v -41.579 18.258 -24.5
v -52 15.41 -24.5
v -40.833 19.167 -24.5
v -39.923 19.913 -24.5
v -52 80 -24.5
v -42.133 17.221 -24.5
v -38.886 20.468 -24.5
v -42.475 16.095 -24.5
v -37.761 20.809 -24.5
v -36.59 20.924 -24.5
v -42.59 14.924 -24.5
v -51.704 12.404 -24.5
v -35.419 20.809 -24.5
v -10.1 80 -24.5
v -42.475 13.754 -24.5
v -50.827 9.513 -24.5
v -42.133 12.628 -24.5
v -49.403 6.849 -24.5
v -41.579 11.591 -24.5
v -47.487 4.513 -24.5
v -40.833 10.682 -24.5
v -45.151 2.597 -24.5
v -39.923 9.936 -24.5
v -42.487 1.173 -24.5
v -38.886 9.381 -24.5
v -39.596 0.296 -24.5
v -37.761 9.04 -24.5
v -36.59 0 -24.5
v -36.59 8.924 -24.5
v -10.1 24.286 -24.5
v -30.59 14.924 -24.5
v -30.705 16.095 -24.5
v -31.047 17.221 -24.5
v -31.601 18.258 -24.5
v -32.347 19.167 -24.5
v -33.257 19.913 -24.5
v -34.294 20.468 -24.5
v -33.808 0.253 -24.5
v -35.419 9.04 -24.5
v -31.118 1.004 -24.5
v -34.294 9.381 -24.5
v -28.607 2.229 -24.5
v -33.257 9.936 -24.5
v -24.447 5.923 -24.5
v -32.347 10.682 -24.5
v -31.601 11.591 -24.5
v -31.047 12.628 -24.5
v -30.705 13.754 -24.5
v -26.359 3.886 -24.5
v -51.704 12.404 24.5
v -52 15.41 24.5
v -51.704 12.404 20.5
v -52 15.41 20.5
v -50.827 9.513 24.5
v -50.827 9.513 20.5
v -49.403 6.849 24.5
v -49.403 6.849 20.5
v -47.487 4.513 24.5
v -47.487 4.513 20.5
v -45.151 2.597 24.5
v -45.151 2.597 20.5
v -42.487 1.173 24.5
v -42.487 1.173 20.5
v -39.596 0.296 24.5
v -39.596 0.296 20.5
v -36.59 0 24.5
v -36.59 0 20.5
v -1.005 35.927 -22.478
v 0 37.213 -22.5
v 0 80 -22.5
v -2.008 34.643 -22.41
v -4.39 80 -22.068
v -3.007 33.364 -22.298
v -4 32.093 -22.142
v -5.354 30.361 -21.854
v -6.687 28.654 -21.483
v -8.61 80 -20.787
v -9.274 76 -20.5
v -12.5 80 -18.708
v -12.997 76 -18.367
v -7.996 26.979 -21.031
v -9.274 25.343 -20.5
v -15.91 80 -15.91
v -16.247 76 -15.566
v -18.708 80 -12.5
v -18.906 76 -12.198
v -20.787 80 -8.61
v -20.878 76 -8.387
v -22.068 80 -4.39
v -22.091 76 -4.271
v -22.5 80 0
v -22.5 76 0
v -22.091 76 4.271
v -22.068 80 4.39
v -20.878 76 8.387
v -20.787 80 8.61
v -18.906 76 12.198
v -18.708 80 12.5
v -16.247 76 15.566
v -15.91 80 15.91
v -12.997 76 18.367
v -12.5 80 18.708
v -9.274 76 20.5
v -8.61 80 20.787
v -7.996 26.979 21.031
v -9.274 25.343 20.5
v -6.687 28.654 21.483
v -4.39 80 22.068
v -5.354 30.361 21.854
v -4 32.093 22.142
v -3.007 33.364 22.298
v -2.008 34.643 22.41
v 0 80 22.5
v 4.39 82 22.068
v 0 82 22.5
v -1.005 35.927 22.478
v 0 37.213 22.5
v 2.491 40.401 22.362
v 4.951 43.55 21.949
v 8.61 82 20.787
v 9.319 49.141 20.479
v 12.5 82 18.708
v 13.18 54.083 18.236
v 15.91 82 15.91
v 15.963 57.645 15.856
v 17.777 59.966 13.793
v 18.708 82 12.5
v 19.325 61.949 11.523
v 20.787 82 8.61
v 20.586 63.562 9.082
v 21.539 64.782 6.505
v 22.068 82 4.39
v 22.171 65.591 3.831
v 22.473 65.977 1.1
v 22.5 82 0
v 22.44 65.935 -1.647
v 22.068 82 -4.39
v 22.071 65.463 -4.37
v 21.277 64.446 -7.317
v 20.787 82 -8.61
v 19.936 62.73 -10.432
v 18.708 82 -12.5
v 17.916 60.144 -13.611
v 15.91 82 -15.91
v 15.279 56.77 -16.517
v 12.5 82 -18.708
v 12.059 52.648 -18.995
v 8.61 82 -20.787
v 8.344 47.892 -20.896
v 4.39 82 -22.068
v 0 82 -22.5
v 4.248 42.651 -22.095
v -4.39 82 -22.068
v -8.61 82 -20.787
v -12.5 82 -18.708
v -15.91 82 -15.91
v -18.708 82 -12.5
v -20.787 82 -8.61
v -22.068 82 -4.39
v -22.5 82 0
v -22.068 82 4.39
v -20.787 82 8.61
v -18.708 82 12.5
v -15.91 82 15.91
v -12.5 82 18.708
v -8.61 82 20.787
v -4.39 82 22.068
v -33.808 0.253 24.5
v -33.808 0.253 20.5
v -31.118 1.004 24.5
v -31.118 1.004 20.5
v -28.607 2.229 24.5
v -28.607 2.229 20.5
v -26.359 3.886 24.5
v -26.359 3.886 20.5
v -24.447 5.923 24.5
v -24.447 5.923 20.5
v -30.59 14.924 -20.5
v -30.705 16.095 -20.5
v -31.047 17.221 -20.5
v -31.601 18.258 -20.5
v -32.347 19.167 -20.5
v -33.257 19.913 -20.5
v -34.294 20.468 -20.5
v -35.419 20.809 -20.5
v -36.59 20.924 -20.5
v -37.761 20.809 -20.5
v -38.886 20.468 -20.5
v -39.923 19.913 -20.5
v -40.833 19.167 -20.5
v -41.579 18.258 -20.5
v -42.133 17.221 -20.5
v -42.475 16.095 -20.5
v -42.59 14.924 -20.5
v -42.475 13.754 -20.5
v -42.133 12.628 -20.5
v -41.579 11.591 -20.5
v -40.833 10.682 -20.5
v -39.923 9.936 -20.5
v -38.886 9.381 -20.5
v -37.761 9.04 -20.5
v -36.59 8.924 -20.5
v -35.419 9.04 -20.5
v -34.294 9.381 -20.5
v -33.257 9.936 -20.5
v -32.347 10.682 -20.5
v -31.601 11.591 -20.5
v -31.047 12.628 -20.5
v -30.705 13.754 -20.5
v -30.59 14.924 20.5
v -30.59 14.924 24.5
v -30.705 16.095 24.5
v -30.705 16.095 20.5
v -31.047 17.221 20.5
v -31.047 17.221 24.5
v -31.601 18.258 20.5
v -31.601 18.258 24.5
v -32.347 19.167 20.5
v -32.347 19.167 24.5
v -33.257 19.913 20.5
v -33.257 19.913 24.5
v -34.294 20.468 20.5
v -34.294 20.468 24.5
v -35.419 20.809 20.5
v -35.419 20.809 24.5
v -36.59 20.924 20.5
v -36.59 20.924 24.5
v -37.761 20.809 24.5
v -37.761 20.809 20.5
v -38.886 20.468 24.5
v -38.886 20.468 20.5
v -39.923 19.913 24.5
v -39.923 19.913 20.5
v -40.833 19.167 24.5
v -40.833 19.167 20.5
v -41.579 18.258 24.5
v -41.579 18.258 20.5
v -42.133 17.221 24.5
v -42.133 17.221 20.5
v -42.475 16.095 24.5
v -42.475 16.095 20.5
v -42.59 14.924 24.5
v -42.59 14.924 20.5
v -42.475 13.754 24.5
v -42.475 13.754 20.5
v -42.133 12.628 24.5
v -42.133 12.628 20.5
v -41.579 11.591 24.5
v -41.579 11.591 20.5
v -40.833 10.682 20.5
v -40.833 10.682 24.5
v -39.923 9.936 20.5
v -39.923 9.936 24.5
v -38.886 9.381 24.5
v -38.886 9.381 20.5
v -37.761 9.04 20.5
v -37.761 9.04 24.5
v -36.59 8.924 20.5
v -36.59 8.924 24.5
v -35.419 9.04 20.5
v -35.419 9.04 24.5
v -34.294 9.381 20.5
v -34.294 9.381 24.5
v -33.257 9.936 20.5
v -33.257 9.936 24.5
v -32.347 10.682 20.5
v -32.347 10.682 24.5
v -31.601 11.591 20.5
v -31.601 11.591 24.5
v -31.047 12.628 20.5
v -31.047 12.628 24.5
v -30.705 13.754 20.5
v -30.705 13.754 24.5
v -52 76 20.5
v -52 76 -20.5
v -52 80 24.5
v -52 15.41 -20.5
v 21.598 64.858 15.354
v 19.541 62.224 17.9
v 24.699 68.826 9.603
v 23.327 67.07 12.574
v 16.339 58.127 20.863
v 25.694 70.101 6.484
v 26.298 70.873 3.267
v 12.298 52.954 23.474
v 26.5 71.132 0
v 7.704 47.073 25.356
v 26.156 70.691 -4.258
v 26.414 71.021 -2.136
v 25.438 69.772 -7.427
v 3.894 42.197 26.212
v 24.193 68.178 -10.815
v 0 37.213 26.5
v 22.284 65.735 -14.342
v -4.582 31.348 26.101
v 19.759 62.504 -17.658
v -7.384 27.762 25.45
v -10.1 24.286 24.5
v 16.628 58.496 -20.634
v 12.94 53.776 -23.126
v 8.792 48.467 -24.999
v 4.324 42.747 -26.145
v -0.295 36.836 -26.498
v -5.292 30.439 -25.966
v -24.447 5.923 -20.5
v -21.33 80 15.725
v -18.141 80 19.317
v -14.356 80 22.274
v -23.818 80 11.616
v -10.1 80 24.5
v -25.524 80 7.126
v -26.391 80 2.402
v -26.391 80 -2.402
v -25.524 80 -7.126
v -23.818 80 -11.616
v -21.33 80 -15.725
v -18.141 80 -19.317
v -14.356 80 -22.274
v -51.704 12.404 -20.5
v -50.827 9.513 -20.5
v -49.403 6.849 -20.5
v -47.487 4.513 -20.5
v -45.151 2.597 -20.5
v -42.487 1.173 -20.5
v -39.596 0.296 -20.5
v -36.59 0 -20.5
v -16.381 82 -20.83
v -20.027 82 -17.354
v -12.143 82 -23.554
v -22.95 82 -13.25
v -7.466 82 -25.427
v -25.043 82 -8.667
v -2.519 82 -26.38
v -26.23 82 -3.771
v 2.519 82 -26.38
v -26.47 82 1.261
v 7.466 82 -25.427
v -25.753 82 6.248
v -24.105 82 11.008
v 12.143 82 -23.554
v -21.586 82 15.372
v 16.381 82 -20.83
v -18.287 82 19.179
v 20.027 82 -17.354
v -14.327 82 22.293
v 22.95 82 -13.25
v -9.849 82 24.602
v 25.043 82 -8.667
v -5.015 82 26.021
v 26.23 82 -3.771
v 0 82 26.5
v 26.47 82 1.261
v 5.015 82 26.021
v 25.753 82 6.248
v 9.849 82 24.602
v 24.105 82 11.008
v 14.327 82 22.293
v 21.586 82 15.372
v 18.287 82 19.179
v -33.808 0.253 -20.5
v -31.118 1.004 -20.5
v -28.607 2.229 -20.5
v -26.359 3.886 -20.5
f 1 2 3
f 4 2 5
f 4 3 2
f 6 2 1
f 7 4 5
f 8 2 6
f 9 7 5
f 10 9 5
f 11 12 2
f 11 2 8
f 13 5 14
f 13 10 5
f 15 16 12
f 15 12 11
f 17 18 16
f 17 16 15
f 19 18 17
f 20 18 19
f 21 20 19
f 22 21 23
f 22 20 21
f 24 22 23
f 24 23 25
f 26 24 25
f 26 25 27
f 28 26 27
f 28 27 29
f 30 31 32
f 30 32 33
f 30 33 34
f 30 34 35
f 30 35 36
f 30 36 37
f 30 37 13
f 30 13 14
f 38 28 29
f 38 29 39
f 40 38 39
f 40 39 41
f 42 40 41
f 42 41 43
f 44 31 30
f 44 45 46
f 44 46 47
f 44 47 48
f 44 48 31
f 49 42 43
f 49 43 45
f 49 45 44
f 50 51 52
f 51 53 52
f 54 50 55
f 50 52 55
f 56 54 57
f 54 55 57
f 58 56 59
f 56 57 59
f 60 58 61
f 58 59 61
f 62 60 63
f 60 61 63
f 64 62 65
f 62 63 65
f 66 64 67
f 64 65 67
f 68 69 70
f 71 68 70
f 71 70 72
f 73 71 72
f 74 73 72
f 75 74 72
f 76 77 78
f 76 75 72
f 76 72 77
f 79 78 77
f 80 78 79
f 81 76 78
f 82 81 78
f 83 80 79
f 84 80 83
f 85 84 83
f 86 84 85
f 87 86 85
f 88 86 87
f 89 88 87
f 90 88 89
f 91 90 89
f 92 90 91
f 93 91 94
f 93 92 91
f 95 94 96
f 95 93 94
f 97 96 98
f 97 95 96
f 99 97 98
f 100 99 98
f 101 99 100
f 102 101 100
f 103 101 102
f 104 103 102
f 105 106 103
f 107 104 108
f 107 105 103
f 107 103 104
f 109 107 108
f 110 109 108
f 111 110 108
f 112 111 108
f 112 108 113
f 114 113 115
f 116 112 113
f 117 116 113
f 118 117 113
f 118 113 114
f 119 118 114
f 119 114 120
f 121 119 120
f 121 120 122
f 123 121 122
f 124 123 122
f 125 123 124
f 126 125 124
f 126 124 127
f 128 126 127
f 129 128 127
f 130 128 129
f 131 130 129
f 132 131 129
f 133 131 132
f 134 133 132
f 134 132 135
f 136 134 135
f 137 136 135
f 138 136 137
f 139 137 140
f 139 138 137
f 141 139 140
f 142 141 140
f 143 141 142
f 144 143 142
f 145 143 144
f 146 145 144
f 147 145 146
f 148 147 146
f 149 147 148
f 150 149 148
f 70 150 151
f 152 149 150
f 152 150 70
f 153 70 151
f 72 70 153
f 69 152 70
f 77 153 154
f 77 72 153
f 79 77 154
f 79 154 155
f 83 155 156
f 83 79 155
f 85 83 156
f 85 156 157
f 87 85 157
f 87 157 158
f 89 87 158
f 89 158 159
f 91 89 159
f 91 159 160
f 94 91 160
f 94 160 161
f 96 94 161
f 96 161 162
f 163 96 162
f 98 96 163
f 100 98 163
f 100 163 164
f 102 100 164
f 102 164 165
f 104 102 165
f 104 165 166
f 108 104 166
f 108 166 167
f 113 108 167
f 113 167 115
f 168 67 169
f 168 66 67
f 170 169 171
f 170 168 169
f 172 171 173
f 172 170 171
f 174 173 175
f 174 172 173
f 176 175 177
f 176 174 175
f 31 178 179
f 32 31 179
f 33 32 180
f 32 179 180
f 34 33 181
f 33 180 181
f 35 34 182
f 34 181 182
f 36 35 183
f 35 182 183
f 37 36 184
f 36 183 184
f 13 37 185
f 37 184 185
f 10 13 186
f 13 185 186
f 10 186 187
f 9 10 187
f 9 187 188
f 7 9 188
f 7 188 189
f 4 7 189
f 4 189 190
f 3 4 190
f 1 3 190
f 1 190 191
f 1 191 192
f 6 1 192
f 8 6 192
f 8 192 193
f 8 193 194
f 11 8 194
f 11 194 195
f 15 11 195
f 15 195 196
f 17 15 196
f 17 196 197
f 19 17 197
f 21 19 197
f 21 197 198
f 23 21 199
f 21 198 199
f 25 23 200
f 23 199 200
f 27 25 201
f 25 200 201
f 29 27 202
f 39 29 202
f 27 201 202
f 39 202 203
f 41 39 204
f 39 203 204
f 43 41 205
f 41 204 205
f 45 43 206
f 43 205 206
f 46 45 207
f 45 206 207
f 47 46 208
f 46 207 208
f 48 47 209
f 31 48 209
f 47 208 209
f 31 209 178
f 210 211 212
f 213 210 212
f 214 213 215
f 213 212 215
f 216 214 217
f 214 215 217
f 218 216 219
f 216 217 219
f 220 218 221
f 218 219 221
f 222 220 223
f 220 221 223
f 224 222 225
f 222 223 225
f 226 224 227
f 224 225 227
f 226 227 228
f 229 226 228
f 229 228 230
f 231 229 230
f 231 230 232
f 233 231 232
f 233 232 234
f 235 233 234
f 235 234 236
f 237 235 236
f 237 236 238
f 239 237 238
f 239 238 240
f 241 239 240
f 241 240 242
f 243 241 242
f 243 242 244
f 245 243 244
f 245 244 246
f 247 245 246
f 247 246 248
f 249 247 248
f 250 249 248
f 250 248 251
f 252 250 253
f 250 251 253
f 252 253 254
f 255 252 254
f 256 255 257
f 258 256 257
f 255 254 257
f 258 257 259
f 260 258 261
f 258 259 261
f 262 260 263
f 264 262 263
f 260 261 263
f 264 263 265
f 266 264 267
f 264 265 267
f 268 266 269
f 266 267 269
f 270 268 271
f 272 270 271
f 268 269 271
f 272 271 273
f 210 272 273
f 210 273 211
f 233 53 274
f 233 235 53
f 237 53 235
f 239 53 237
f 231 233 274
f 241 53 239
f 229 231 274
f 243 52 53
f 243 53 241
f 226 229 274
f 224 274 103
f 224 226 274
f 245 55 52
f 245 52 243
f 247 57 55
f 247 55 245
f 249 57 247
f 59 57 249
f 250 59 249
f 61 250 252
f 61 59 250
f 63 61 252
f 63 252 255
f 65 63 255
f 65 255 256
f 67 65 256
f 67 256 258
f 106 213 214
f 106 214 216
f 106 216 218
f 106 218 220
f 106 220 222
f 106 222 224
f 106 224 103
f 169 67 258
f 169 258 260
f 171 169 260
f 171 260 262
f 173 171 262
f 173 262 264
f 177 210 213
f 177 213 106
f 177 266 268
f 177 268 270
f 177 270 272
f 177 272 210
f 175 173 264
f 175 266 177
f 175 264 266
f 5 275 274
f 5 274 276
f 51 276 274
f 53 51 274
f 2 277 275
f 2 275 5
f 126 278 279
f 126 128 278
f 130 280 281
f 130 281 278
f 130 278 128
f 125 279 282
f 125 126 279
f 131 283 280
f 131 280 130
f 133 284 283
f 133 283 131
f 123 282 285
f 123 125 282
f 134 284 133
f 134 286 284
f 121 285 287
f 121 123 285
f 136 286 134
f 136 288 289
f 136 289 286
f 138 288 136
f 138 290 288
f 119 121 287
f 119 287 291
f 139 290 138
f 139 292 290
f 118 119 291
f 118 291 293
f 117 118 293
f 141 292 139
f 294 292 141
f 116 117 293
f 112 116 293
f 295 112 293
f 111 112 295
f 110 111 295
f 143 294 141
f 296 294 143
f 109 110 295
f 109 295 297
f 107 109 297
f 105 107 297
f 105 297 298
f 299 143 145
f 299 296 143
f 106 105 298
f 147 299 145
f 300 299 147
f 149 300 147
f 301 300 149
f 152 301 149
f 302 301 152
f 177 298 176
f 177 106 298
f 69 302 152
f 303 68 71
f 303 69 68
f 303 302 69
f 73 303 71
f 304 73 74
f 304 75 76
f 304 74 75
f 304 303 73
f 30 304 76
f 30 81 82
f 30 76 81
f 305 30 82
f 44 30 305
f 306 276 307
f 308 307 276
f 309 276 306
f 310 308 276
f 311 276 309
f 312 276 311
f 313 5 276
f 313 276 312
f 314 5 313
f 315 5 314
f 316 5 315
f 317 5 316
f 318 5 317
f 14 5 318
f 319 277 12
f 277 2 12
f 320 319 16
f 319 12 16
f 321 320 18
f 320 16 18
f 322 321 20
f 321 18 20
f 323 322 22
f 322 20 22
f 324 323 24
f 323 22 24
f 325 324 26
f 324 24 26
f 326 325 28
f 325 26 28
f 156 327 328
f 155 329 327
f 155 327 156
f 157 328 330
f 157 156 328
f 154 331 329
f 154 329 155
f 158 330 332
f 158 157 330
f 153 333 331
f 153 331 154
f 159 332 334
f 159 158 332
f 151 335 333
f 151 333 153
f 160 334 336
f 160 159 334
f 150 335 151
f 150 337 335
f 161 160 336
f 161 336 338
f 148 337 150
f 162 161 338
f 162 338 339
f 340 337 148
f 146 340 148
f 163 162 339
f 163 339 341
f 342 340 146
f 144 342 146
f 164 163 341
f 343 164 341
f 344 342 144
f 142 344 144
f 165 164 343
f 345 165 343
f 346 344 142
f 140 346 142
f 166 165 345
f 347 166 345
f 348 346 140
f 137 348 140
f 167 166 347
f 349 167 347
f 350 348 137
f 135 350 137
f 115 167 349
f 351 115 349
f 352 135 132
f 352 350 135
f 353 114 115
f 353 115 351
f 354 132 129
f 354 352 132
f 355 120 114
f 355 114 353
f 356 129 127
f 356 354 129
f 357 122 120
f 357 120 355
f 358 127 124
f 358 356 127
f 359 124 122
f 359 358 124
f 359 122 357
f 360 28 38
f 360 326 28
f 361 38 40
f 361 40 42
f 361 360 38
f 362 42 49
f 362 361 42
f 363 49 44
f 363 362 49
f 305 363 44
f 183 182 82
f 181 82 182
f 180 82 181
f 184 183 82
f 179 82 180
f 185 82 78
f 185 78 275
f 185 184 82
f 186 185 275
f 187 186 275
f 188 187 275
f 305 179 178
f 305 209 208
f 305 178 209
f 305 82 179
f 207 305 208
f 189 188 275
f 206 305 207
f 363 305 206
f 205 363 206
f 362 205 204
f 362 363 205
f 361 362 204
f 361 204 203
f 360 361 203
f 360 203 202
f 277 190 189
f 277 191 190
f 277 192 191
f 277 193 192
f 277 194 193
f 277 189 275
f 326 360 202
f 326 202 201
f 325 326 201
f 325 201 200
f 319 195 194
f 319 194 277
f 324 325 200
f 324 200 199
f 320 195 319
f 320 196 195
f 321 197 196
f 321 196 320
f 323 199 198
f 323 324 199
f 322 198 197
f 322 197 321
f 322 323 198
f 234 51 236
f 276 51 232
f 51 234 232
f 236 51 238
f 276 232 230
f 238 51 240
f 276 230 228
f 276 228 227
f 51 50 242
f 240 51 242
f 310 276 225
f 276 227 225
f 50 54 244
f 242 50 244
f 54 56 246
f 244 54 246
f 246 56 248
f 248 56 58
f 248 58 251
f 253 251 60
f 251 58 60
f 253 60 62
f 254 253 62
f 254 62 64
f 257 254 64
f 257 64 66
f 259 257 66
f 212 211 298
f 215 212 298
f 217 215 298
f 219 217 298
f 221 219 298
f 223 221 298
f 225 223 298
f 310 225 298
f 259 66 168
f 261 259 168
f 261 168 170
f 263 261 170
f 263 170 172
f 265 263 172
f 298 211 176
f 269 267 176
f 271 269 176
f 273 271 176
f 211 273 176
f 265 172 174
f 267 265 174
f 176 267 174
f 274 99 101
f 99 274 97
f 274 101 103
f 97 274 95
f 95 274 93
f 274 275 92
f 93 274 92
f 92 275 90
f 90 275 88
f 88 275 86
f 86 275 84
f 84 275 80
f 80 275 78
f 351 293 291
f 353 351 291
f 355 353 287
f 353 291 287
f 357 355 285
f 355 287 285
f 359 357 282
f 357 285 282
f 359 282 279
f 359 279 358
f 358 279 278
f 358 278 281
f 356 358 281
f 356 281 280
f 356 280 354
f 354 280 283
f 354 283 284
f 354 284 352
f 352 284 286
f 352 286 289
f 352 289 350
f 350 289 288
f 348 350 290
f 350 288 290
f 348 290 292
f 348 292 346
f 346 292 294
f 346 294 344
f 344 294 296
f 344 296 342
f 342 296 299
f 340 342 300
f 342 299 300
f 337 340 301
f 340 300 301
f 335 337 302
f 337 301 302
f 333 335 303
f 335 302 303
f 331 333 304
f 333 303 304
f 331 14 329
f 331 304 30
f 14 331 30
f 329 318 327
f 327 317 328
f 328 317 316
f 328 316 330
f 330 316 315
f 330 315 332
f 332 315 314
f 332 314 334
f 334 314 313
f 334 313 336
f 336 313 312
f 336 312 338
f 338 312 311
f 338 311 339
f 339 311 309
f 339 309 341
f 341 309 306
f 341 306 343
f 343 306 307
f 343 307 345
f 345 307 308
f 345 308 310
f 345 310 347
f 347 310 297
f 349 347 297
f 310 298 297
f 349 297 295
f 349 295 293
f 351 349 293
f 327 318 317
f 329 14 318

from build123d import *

# Parameters (mm, degrees)
SKETCH1_R               = 26.5
SKETCH1_R_2             = 22.5
BOSS_EXTRUDE1_DEPTH     = 82
SKETCH3_W               = 52
SKETCH3_H               = 49
BOSS_EXTRUDE2_DEPTH     = 80
CUT_EXTRUDE1_DEPTH      = 101.649143066
CUT_EXTRUDE1_DEPTH_BACK = 101.649143066
SHELL1_DEPTH            = 76
CUT_EXTRUDE2_START      = -80
CUT_EXTRUDE2_DEPTH      = 80
FILLET1_R               = 15.409961
FILLET2_R               = 15.409961
SKETCH6_R               = 6
CUT_EXTRUDE3_DEPTH      = 80


# Read off the part's stored shape, not the designer's step: Shell1
with BuildPart() as part:
    # Sketch1 → Boss-Extrude1 (new body)
    with BuildSketch(Plane(origin=(0, 0, 0), x_dir=(1, 0, 0), z_dir=(0, 1, 0))):
        with Locations(Location((0, 0, 0), (0, 0, 270))):
            Circle(SKETCH1_R)
        with Locations(Location((0, 0, 0), (0, 0, 270))):
            Circle(SKETCH1_R_2, mode=Mode.SUBTRACT)
    extrude(amount=BOSS_EXTRUDE1_DEPTH)

    # Sketch3 → Boss-Extrude2 (add)
    with BuildSketch(Plane(origin=(0, 0, 0), x_dir=(1, 0, 0), z_dir=(0, 1, 0))):
        with Locations((-26, 0)):
            Rectangle(SKETCH3_W, SKETCH3_H)
    extrude(amount=BOSS_EXTRUDE2_DEPTH)

    # Sketch4 → Cut-Extrude1 (cut, two sides: drawn at the far end of the back side and taken through both)
    with BuildSketch(Plane.XY.offset(-CUT_EXTRUDE1_DEPTH_BACK)):
        Polygon((163.095245714, 245.965543737), (26.5, 71.131601988), (-29.074098223, 0), (-165.669343938, -174.833941749), (183.998539561, -448.024433177), (512.763129212, -27.224947691), align=None)
    extrude(amount=CUT_EXTRUDE1_DEPTH + CUT_EXTRUDE1_DEPTH_BACK, mode=Mode.SUBTRACT)

    # Shell1 outline → Shell1 (cut)
    with BuildSketch(Plane(origin=(0, 0, 0), x_dir=(1, 0, 0), z_dir=(0, 1, 0))):
        with BuildLine():
            ThreePointArc((-9.273618496, -20.5), (-6.687371777, -21.483227381), (-4, -22.141589825))
            Line((-4, -22.141589825), (-4, 22.141589825))
            ThreePointArc((-4, 22.141589825), (-6.687371776, 21.483227381), (-9.273618495, 20.5))
            Line((-9.273618495, 20.5), (-52, 20.5))
            Line((-52, 20.5), (-52, -20.5))
            Line((-52, -20.5), (-9.273618496, -20.5))
        make_face()
    extrude(amount=SHELL1_DEPTH, mode=Mode.SUBTRACT)

    # Sketch5 → Cut-Extrude2 (cut)
    with BuildSketch(Plane(origin=(0, 80, 0), x_dir=(1, 0, 0), z_dir=(0, 1, 0)).offset(CUT_EXTRUDE2_START)):
        with BuildLine():
            Line((0, -22.5), (0, 22.5))
            ThreePointArc((0, 22.5), (-22.5, 0), (0, -22.5))
        make_face()
    extrude(amount=CUT_EXTRUDE2_DEPTH, mode=Mode.SUBTRACT)

    # Fillet1
    fillet1_edges = [part.edges().sort_by_distance(p)[0] for p in [
        (-52, 0, -22.5),
        (-29.074098223, 0, -22.5),
    ]]
    fillet(fillet1_edges, radius=FILLET1_R)

    # Fillet2
    fillet2_edges = [part.edges().sort_by_distance(p)[0] for p in [
        (-29.074098223, 0, 22.5),
        (-52, 0, 22.5),
    ]]
    fillet(fillet2_edges, radius=FILLET2_R)

    # Sketch6 → Cut-Extrude3 (cut)
    with BuildSketch(Plane.XY.offset(24.5)):
        with Locations((-36.590038591, 14.924477303)):
            Circle(SKETCH6_R)
    extrude(amount=-CUT_EXTRUDE3_DEPTH, mode=Mode.SUBTRACT)


solid = part.part
